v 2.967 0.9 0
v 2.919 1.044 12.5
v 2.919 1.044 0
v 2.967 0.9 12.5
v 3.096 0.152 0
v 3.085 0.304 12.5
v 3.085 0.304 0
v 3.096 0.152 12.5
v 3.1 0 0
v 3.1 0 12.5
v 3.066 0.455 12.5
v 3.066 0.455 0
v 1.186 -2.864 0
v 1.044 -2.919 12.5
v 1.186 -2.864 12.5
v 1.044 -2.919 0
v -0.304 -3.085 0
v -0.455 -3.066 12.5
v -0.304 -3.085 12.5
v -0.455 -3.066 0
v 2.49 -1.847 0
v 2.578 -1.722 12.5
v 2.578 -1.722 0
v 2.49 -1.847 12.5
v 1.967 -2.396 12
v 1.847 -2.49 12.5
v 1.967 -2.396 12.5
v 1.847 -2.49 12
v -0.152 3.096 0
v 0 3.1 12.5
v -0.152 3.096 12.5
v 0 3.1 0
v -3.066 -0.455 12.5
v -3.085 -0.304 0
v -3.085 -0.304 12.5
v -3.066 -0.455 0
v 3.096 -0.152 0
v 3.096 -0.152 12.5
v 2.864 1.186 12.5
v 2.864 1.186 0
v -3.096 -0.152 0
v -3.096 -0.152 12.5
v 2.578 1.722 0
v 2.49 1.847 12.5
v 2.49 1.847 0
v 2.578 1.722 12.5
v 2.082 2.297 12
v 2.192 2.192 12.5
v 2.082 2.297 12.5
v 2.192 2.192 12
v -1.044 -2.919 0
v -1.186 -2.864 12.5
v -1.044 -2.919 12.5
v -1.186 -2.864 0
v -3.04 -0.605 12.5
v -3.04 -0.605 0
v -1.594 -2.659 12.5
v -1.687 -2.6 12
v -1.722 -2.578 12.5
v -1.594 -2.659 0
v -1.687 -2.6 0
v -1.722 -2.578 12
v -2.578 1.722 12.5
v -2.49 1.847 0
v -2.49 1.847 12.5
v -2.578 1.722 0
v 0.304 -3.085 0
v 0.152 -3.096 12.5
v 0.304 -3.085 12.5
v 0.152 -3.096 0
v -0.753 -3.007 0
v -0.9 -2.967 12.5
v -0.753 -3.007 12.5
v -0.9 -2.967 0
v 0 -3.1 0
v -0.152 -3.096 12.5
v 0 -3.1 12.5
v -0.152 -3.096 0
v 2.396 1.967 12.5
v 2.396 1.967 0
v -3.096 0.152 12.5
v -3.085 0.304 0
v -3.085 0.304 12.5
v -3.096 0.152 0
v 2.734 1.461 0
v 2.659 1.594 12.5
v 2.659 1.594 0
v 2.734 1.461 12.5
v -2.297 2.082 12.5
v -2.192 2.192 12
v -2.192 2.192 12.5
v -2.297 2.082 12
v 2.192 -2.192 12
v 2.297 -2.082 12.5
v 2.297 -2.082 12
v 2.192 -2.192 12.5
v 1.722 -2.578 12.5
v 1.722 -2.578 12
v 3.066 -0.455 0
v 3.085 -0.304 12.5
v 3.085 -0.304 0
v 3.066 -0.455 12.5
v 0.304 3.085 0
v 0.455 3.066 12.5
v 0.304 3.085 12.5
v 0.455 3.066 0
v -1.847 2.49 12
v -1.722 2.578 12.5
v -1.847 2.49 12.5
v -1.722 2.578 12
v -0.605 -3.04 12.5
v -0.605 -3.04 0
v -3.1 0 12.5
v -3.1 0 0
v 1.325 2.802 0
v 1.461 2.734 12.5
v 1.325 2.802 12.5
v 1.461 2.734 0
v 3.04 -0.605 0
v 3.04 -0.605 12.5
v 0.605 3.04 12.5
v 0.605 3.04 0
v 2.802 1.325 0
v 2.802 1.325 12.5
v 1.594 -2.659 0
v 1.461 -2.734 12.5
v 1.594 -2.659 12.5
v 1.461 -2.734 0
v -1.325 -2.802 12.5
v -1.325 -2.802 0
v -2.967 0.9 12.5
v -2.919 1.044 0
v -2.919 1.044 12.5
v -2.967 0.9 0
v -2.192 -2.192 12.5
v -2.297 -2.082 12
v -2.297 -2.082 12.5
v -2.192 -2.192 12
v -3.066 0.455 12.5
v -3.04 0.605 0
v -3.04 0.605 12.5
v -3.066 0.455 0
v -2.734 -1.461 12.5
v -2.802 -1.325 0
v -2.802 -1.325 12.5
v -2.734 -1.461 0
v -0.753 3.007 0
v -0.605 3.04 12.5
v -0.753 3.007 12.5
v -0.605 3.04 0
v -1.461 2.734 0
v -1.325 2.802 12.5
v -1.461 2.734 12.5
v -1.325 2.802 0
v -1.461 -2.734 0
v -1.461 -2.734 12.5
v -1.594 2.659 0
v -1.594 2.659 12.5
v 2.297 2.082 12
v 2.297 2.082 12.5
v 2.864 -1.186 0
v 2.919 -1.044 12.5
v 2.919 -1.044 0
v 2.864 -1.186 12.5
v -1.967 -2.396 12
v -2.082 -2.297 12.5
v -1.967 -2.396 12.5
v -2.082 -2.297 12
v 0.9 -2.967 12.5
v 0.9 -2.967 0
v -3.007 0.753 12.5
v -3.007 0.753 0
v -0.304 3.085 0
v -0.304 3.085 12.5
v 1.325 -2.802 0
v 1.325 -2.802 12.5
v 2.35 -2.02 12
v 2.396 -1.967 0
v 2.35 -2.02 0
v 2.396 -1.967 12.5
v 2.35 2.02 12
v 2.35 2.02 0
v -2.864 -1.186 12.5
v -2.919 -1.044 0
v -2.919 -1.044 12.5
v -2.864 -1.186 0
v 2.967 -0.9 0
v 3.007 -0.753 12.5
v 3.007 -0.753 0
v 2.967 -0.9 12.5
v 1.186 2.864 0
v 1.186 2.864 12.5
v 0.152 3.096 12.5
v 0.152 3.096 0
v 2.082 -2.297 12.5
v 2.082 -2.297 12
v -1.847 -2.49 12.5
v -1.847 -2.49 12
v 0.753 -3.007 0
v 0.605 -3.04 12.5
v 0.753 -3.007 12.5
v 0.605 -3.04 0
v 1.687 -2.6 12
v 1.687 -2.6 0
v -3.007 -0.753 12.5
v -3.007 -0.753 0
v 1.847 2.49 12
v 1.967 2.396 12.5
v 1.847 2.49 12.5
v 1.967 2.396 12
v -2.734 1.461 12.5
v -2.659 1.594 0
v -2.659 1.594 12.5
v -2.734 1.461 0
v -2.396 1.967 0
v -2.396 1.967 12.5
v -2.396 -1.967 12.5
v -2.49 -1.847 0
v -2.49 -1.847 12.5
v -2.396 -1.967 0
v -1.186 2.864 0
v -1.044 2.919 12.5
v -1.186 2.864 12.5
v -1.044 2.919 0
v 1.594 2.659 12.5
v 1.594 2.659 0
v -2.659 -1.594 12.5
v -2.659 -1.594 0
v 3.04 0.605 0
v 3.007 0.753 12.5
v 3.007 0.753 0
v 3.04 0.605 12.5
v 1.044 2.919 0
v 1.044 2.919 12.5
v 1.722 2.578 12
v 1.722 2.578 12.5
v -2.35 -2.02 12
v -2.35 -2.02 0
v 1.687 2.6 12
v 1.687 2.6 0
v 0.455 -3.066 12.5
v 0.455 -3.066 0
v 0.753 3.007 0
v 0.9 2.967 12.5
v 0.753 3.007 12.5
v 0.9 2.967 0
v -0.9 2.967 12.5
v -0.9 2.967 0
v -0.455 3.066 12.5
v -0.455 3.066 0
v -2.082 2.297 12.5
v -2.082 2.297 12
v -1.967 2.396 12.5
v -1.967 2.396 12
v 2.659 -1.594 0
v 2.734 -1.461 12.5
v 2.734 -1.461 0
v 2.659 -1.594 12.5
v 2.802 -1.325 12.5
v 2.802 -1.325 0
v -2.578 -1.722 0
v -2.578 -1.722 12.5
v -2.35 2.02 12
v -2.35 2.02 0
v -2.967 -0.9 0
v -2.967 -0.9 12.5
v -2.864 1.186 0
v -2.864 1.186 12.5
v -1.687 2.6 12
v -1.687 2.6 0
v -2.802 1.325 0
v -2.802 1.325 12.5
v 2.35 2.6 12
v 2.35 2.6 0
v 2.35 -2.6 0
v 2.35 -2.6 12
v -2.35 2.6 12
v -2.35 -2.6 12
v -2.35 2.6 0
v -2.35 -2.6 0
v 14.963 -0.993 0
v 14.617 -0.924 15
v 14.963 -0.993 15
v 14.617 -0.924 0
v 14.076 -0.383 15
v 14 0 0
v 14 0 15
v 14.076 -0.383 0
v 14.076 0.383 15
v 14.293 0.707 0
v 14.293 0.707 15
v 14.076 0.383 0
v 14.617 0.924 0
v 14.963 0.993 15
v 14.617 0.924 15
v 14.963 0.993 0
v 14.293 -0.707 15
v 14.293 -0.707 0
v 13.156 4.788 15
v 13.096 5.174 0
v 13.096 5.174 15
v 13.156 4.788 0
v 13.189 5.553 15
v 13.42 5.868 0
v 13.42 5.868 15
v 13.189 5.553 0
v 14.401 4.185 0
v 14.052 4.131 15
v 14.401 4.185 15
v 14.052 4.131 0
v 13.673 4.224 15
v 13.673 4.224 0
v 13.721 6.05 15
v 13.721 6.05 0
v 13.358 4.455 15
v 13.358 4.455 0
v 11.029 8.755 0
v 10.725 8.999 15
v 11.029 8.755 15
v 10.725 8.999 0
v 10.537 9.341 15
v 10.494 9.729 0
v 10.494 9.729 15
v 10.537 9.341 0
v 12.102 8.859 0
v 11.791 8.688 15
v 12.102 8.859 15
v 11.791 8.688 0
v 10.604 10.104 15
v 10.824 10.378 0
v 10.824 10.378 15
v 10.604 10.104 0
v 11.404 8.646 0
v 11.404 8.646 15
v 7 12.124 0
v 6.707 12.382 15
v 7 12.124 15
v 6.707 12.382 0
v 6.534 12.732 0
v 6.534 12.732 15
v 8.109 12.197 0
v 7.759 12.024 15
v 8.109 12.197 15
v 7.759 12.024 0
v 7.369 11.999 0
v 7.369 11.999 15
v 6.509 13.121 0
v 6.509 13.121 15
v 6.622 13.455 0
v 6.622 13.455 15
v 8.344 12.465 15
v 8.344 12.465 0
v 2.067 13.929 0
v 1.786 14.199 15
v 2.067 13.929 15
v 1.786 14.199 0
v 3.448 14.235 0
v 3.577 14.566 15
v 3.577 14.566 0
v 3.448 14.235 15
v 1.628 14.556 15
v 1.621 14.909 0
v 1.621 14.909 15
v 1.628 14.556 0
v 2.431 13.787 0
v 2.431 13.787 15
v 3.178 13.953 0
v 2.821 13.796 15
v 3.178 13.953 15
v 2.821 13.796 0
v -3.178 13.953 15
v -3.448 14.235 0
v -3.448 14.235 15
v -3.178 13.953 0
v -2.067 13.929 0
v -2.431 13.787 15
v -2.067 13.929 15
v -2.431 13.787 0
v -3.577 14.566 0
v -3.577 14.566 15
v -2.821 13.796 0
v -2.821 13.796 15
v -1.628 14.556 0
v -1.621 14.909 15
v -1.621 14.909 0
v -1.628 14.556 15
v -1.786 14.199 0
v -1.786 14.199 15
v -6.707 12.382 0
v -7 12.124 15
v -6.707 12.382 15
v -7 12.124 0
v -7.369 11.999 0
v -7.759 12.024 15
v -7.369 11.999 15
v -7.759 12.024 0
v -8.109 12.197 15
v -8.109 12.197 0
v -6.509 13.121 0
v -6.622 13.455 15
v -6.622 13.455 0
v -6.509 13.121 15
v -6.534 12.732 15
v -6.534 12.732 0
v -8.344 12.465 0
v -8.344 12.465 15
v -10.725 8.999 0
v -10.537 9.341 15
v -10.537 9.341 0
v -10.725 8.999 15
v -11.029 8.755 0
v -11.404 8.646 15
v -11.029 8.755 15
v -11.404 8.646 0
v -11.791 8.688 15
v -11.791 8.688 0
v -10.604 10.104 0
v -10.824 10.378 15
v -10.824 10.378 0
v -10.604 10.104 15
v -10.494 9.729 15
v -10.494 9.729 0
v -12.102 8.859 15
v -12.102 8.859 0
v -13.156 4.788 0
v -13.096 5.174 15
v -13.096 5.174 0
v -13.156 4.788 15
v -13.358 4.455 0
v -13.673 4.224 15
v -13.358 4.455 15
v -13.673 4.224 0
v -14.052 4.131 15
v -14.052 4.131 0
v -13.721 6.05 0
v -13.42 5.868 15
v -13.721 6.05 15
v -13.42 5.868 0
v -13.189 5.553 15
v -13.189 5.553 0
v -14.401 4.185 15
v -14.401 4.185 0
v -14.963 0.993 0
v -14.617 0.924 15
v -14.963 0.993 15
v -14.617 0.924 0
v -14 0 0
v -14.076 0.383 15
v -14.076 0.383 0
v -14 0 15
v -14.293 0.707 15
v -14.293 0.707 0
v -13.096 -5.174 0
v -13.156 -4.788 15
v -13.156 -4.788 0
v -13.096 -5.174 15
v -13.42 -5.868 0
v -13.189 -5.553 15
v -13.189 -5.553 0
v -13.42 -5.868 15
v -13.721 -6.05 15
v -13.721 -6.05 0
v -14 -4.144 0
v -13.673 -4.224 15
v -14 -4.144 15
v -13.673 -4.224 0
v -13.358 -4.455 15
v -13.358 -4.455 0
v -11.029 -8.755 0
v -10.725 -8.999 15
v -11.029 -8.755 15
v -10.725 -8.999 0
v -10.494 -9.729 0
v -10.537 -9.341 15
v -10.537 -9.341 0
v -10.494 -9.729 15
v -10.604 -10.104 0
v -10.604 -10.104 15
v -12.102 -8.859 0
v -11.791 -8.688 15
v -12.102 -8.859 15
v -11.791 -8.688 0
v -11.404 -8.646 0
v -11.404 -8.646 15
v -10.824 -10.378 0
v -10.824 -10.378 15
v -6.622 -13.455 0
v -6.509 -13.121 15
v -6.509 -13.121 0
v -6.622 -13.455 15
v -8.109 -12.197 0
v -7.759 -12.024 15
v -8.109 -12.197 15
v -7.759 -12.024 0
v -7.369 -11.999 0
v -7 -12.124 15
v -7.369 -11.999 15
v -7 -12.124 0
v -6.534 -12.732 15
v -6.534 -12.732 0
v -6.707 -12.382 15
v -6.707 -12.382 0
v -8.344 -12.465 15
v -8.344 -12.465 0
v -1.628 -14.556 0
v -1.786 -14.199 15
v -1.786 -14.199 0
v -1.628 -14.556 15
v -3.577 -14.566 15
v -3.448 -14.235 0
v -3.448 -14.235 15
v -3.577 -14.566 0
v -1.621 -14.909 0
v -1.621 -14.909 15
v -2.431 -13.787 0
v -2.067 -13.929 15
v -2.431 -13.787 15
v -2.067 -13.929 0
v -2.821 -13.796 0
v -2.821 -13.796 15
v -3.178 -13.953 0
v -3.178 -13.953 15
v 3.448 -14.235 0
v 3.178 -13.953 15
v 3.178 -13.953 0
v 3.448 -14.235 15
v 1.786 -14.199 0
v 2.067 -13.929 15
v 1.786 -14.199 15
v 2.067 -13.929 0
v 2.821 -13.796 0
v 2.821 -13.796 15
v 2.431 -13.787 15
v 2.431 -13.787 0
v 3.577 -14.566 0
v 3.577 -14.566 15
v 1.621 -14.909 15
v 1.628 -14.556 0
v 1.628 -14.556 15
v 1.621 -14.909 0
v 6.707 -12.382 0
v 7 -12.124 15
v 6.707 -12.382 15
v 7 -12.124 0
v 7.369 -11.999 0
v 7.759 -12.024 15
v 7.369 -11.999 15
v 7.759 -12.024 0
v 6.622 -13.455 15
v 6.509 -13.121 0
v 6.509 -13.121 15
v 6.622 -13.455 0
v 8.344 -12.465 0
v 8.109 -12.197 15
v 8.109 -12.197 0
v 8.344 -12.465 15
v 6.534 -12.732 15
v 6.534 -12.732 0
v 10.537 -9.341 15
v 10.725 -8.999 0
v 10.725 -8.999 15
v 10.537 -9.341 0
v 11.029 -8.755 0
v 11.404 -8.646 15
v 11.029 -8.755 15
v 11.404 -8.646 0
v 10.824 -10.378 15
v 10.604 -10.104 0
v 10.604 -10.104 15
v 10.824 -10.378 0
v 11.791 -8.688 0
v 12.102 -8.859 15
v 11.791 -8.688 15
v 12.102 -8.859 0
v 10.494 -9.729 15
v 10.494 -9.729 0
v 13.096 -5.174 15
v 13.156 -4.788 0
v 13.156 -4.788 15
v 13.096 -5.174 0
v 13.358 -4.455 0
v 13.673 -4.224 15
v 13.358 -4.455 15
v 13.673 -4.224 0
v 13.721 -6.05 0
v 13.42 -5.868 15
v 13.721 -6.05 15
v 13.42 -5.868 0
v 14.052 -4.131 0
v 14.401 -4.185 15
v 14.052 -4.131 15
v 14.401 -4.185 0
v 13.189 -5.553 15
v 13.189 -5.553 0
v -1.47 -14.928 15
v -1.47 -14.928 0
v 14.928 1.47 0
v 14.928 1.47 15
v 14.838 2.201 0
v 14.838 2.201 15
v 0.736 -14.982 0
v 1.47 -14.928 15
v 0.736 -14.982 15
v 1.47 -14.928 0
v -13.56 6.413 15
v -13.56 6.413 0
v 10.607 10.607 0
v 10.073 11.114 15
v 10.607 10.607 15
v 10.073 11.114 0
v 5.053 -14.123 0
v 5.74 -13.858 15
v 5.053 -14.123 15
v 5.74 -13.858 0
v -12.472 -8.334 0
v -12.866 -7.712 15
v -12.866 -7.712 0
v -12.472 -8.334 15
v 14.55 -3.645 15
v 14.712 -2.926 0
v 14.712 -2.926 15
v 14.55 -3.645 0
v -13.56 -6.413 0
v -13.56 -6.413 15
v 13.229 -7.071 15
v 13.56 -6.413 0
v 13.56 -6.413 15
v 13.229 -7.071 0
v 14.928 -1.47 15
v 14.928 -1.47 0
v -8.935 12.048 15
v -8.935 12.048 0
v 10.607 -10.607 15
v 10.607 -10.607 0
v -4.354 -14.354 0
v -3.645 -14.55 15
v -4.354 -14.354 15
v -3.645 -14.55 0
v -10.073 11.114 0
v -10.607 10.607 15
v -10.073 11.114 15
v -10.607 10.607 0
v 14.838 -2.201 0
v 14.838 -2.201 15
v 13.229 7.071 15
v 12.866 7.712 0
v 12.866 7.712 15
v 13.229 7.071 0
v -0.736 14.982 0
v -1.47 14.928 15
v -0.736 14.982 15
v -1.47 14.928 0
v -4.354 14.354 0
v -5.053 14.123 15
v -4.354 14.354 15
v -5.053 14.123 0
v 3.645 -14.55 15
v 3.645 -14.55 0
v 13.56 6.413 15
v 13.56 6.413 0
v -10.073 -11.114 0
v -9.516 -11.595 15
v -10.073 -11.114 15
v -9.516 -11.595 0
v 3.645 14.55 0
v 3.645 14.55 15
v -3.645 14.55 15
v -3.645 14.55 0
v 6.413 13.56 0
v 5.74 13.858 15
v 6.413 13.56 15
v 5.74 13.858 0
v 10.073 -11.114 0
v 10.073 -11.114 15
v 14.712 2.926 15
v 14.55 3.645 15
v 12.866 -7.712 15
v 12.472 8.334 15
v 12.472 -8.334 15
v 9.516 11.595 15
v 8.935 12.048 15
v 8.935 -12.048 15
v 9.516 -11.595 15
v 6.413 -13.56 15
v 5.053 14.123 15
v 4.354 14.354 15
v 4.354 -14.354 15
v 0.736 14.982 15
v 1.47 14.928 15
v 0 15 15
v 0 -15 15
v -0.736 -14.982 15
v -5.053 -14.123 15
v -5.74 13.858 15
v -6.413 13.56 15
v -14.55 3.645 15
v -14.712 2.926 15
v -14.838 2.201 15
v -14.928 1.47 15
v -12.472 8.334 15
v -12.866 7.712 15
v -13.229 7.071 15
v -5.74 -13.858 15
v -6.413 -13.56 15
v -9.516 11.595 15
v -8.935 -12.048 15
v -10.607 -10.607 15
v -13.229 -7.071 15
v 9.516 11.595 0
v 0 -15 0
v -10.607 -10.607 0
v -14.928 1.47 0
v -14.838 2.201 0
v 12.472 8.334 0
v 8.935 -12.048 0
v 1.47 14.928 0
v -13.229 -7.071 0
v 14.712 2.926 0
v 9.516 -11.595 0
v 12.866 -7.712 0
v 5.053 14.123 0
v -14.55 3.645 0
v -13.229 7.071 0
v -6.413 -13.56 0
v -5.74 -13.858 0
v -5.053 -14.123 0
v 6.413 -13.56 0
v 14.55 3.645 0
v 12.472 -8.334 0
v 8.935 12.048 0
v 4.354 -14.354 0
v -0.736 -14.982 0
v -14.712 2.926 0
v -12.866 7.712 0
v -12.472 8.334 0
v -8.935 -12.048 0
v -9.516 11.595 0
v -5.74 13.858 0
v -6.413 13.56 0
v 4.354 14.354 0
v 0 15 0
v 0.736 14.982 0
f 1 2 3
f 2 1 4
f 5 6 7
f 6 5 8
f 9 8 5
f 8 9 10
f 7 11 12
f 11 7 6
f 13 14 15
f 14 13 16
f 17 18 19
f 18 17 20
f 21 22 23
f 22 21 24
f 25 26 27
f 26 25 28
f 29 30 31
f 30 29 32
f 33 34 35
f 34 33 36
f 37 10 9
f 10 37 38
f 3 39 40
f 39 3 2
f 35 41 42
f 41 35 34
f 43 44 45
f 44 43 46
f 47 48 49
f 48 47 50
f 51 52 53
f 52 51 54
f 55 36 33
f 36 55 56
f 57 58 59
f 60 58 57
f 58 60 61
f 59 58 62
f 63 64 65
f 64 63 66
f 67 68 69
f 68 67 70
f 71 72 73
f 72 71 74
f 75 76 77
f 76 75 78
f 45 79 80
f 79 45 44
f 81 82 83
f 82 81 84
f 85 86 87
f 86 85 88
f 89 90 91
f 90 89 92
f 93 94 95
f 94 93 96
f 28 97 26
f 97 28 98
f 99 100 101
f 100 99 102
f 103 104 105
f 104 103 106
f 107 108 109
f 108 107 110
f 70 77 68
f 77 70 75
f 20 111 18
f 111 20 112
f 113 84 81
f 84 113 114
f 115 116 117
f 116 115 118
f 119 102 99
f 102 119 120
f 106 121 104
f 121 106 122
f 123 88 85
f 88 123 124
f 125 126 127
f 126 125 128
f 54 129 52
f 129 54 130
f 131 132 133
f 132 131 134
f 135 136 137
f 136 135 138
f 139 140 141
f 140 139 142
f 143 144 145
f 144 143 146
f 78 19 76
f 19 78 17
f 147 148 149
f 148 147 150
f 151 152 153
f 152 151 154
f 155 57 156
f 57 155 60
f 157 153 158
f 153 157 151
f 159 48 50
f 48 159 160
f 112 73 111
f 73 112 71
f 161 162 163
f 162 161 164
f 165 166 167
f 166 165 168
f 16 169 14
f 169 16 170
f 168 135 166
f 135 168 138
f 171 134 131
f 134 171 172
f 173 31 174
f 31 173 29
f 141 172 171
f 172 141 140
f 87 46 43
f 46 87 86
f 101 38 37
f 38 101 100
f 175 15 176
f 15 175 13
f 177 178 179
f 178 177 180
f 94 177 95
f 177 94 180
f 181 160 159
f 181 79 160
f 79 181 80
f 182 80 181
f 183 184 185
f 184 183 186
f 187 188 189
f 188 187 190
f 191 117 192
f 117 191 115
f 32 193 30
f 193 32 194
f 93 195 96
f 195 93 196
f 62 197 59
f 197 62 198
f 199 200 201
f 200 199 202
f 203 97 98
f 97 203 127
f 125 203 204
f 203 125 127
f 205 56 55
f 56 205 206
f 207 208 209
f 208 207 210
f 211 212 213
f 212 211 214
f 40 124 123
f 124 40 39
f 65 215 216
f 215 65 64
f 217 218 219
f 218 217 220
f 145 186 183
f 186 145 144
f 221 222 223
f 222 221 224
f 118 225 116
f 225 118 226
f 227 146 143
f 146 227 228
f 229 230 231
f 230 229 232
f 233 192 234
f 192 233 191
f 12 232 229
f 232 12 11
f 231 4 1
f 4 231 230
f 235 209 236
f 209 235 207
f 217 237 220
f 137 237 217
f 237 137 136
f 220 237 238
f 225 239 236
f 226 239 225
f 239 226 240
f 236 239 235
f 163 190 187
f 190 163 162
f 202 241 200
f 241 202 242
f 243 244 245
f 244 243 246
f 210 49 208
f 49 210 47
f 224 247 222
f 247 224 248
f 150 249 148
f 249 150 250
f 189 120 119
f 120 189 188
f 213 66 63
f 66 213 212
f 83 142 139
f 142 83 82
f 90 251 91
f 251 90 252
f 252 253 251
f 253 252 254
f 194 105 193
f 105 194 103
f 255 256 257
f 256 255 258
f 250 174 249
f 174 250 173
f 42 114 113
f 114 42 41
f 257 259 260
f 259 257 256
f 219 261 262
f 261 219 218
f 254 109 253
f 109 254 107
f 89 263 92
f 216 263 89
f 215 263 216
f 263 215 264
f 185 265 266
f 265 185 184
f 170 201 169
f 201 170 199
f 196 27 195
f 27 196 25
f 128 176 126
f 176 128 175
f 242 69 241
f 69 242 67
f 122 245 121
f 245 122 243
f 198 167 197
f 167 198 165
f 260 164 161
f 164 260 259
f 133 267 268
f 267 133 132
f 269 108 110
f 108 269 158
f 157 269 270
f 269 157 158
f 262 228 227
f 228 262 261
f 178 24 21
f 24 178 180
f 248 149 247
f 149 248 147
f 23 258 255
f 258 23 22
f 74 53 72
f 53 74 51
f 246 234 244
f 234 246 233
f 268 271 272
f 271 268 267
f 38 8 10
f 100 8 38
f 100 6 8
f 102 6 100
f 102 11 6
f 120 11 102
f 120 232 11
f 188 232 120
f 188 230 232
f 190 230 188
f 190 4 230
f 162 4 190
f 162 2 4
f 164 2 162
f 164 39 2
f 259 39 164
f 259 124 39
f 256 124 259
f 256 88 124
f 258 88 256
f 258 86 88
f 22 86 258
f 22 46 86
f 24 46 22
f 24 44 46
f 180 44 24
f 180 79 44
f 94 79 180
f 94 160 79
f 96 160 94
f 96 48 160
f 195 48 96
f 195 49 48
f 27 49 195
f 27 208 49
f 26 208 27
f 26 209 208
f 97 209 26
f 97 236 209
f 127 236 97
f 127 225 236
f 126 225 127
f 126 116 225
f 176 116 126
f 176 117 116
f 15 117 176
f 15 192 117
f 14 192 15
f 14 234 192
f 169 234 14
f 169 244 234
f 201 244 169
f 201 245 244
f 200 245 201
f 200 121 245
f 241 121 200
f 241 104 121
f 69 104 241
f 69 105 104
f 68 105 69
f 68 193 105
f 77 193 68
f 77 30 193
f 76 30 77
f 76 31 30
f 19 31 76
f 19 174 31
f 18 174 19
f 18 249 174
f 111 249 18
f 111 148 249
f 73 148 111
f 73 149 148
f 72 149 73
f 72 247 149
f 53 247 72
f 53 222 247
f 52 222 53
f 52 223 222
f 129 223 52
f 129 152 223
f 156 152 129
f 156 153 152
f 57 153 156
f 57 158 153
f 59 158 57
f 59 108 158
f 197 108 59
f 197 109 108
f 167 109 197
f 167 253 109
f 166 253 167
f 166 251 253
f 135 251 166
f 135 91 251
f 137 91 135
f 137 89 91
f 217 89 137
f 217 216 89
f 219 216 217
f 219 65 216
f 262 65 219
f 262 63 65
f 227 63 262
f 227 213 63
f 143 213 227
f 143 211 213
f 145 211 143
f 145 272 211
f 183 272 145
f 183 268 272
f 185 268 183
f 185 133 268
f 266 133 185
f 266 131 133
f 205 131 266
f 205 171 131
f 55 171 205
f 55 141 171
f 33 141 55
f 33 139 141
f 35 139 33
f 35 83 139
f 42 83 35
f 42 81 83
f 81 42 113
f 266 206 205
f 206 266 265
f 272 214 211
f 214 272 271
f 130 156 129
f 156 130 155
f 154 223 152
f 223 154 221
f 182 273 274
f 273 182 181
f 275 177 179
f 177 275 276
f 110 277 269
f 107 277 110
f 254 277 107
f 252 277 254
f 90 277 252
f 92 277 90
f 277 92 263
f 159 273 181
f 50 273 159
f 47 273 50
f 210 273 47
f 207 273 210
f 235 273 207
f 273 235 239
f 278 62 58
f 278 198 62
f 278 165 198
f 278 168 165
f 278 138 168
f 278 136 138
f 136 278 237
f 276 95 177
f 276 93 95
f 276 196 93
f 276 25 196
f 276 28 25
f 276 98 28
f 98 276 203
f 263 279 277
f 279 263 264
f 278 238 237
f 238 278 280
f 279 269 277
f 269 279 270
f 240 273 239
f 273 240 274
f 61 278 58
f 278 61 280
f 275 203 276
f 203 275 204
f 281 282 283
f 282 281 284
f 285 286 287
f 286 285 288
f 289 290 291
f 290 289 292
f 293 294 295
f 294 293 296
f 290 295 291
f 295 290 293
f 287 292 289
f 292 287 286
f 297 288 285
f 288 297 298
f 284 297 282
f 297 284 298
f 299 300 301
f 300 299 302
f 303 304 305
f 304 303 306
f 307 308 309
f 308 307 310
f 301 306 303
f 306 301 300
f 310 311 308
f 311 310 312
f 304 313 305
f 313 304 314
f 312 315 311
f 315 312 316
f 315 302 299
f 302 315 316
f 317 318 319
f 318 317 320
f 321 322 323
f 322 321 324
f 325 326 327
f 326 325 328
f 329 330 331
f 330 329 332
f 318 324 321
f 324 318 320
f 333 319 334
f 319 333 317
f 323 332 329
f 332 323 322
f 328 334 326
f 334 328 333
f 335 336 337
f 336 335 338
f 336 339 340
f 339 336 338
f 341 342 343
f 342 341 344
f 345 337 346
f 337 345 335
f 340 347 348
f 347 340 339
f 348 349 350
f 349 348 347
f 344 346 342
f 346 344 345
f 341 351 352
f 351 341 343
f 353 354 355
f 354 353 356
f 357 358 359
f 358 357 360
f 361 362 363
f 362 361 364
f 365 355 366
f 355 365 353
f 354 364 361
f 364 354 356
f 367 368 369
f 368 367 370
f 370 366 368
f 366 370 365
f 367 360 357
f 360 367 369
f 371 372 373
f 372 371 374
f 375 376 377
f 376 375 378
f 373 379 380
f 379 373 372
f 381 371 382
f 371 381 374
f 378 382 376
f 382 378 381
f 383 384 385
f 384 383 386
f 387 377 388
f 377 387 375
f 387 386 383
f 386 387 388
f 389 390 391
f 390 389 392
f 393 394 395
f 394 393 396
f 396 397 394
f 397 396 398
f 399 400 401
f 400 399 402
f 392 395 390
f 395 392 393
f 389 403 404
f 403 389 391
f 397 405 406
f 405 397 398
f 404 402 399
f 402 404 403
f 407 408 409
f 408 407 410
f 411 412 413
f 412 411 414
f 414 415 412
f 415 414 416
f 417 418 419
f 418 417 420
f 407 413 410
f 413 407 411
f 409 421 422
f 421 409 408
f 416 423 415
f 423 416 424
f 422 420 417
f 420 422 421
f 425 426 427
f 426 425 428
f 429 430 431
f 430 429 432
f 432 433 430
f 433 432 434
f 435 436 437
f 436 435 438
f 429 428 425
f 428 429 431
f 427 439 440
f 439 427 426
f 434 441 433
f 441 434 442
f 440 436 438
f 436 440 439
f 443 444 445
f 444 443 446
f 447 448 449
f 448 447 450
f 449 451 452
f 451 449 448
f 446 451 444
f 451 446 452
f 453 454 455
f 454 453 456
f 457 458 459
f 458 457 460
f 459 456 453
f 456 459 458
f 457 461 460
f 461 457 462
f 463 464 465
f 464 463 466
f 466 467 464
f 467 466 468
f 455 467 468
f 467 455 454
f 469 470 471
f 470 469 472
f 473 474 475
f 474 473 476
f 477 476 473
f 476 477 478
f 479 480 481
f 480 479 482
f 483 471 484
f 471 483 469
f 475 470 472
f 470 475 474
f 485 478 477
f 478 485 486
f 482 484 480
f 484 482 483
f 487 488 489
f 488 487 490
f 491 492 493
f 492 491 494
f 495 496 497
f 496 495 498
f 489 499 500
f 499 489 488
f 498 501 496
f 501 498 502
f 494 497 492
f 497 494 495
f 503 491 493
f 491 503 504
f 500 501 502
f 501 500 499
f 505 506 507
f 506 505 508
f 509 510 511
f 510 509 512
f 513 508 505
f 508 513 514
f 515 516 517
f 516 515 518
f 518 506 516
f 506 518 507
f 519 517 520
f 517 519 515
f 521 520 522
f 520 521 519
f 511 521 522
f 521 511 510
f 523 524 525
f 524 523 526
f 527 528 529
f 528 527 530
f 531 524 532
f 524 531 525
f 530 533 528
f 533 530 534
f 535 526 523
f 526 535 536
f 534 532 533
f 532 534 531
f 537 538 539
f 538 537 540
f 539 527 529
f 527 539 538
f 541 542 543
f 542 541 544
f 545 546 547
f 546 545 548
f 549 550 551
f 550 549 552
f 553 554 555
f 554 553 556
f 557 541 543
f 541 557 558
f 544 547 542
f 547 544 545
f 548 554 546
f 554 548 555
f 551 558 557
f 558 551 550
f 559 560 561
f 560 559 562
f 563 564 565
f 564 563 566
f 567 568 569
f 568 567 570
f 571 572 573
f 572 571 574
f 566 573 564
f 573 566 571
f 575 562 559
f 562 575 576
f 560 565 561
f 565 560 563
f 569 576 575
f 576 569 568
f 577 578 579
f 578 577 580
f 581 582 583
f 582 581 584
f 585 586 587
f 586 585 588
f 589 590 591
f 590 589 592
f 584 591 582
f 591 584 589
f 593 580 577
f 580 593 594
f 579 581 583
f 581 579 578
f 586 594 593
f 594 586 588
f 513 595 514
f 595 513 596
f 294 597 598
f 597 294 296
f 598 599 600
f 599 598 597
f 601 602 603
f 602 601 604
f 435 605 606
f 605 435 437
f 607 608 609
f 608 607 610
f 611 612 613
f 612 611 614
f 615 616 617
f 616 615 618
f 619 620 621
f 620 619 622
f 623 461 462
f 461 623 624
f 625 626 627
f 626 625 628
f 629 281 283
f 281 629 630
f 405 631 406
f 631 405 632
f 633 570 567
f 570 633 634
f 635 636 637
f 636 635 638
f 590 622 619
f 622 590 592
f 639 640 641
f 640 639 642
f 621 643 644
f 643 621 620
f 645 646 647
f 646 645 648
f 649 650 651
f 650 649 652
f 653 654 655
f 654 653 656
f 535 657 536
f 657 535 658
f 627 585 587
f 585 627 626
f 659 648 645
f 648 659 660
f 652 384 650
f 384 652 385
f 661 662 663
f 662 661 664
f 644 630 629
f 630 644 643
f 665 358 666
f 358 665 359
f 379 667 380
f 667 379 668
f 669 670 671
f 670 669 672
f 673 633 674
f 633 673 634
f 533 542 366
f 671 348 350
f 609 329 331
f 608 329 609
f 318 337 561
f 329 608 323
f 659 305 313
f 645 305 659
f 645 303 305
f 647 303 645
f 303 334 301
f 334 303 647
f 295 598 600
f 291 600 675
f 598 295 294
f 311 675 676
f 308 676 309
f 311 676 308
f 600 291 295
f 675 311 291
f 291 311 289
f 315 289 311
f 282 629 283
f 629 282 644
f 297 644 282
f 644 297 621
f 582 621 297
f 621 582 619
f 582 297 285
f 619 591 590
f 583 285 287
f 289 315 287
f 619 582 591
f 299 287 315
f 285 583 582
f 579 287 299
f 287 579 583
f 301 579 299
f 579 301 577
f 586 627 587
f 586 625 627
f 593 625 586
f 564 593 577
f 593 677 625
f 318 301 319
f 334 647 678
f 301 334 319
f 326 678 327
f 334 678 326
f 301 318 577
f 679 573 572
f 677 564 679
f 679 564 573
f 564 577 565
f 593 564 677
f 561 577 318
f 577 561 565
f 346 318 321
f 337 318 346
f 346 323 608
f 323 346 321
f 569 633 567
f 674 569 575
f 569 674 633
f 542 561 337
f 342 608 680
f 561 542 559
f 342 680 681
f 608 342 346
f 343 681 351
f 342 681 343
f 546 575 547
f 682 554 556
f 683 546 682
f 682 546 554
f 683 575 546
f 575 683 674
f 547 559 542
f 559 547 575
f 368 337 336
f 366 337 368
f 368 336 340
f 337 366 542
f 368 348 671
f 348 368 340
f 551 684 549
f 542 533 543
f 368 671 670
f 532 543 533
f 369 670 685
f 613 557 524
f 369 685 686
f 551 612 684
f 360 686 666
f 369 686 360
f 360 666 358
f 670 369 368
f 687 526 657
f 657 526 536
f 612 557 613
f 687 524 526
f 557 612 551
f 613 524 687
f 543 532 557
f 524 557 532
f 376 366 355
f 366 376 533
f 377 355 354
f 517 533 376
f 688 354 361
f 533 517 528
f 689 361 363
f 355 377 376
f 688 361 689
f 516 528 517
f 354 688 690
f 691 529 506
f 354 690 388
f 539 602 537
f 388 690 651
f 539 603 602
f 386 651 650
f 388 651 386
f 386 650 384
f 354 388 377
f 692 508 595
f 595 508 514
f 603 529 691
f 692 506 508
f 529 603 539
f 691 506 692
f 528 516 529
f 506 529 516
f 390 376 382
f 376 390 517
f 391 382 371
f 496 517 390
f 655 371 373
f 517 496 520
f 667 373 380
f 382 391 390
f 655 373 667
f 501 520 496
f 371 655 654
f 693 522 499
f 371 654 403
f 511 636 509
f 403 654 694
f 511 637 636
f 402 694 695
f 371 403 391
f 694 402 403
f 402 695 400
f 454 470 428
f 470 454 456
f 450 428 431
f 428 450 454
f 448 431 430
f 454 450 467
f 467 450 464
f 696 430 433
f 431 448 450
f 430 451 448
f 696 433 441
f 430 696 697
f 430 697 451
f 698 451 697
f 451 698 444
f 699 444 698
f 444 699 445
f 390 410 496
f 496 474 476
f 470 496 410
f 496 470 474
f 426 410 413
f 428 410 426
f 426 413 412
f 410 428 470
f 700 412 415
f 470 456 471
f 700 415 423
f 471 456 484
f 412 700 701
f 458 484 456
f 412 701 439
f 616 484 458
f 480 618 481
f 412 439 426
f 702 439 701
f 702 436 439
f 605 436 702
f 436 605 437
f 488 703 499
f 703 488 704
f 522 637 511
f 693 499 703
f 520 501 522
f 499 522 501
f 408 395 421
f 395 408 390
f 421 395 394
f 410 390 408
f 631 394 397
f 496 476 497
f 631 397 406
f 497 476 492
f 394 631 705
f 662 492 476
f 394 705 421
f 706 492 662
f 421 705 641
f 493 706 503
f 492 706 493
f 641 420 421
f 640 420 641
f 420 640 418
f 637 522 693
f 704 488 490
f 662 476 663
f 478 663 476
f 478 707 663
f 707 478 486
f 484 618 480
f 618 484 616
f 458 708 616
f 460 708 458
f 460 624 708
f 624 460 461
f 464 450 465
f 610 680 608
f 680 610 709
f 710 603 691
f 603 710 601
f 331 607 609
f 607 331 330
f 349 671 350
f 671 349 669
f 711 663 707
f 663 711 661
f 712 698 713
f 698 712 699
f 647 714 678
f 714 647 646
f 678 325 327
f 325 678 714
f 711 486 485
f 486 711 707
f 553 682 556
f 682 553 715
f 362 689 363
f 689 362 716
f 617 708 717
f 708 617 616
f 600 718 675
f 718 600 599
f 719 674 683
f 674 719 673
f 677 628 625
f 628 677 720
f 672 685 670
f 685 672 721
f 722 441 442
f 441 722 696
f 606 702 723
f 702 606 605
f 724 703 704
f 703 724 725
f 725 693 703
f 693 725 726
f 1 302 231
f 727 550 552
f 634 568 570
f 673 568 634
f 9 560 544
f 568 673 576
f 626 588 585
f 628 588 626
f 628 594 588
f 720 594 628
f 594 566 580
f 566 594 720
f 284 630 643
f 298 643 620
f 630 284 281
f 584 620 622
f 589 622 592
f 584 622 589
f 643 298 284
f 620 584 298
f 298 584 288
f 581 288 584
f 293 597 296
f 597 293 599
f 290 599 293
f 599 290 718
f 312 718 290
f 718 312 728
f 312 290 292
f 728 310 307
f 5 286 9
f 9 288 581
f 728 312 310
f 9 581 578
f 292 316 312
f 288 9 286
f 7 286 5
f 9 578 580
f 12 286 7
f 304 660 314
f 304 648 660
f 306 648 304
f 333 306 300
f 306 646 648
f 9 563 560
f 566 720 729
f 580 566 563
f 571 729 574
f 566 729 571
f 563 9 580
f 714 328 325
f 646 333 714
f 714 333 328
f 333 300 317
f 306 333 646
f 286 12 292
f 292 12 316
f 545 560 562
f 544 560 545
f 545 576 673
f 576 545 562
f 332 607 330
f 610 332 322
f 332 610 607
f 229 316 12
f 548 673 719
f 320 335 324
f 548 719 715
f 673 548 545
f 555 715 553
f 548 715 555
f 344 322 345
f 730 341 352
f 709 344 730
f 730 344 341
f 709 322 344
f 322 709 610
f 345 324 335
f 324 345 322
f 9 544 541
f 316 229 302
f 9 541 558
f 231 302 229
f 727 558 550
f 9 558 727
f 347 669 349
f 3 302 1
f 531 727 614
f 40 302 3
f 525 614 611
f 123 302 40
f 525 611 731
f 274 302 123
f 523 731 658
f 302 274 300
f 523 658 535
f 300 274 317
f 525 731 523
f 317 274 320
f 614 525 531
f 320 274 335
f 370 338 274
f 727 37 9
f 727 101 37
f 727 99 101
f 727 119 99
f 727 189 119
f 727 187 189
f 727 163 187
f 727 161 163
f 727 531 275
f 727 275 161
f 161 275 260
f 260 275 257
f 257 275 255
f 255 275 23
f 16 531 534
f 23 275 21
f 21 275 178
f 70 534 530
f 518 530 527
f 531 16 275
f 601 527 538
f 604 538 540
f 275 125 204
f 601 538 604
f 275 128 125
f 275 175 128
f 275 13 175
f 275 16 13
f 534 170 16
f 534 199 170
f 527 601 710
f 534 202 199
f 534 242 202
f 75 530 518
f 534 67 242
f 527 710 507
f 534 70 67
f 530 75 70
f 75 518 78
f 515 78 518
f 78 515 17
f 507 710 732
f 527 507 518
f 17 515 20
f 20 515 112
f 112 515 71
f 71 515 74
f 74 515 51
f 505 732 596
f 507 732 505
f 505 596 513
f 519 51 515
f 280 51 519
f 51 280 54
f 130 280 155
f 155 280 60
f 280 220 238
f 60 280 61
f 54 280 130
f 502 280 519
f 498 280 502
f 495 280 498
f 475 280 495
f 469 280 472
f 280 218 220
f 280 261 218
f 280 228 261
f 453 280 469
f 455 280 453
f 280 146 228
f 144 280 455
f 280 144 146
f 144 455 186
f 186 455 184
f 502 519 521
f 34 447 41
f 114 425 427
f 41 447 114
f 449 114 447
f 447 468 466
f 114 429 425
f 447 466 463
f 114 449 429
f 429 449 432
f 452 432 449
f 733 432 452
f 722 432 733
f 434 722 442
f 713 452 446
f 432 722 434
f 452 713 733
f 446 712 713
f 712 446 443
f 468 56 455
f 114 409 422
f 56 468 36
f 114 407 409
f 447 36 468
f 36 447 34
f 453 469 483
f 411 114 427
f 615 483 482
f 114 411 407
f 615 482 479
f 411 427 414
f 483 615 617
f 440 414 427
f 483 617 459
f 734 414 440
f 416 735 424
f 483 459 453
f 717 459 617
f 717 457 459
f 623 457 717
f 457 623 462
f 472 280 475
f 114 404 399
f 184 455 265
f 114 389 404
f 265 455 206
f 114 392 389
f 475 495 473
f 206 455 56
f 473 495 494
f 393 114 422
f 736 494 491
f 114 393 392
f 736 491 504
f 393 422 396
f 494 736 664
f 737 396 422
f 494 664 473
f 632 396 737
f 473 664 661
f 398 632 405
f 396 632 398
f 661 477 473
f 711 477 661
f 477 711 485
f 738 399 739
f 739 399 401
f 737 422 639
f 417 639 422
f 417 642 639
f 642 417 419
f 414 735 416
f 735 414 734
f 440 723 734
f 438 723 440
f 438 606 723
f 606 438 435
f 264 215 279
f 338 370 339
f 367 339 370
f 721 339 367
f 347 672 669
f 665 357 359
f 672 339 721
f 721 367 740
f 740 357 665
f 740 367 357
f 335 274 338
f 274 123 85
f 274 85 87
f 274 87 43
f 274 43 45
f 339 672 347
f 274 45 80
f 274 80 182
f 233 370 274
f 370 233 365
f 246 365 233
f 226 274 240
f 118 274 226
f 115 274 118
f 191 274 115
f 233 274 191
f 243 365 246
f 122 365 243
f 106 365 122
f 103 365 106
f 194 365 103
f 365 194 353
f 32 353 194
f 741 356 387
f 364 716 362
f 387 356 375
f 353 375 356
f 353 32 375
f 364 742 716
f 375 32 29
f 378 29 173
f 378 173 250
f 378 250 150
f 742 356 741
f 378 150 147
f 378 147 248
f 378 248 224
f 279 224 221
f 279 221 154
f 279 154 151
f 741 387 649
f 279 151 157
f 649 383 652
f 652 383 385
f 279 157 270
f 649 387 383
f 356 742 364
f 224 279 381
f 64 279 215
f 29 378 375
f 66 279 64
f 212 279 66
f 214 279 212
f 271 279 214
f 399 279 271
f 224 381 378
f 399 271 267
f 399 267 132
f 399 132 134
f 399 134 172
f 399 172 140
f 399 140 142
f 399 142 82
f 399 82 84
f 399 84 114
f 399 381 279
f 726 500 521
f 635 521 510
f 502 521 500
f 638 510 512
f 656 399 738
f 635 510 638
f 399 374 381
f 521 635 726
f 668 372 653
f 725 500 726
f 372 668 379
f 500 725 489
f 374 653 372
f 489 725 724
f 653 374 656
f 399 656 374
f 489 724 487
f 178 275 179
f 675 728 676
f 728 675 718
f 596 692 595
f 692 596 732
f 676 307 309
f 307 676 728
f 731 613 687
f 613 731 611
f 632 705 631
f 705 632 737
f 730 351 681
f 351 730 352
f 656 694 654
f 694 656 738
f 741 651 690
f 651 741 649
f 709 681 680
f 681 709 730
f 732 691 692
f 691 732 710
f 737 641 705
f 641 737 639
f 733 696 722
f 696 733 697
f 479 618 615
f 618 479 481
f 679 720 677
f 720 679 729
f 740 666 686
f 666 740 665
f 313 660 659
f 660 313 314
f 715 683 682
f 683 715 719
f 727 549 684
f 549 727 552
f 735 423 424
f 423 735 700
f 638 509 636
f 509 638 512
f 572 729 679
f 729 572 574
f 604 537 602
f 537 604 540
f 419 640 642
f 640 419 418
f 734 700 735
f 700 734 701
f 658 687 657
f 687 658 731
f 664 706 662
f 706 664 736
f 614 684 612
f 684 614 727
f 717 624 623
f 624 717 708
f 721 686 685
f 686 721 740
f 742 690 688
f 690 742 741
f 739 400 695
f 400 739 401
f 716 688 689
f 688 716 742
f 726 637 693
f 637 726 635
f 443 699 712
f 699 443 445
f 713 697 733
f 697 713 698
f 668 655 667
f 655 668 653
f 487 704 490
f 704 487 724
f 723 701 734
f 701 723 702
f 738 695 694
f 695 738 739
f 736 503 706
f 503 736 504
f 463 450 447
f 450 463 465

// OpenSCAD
// Replacement knob for a hotplate stirrer with a 6 mm D-shaft
// Print orientation: bottom face (with bore) on the bed at z = 0

// ---------------- Parameters ----------------
knob_d        = 30;    // knob outer diameter (mm)
knob_h        = 15;    // knob height (mm)

bore_d        = 6.2;   // D-bore circle diameter (mm)
bore_depth    = 12;    // D-bore depth from bottom face (mm)
bore_flat     = 4.7;   // distance from D-bore flat to opposite side (mm)

groove_count  = 18;    // number of vertical grip grooves
groove_d      = 2;     // grip groove diameter (mm)

pointer_w     = 1.5;   // pointer groove width (mm)
pointer_d     = 1;     // pointer groove depth (mm)

eps           = 0.5;   // overcut so cutting faces are not coplanar (mm)

$fn = 128;             // circle resolution

// ---------------- Derived ----------------
function bore_r() = bore_d / 2;
function groove_angle(i) = i * 360 / groove_count;   // evenly spaced

// ---------------- Model ----------------
difference() {
    // Main body: cylinder, centred in X/Y, sitting on z = 0
    cylinder(d = knob_d, h = knob_h);

    // D-shaped blind bore from the bottom face
    translate([0, 0, -eps])
        union() {
            // Circle
            cylinder(r = bore_r(), h = bore_depth + 2 * eps);
            // Flat on one side: extend past the wall, keep the same y span
            translate([-bore_flat / 2, -bore_r() + eps, 0])
                cube([bore_flat, 2 * (bore_r() - eps), bore_depth + eps]);
        }

    // Vertical grip grooves along the full height
    for (i = [0 : groove_count - 1])
        rotate([0, 0, groove_angle(i)])
            translate([knob_d / 2, 0, -eps])
                cylinder(d = groove_d, h = knob_h + 2 * eps, $fn = 16);

    // Pointer groove on the top face, on the same side as the D-flat
    // (extruded along X, so the polygon lies in the X/Y plane)
    translate([-knob_d / 2 - eps, 0, knob_h - pointer_d])
        rotate([90, 0, 0])
            linear_extrude(height = knob_d / 2 + eps)
                polygon([
                    [0,         knob_d / 2],
                    [pointer_w, knob_d / 2],
                    [pointer_w, -knob_d / 2],
                    [0,         -knob_d / 2]
                ]);
}
